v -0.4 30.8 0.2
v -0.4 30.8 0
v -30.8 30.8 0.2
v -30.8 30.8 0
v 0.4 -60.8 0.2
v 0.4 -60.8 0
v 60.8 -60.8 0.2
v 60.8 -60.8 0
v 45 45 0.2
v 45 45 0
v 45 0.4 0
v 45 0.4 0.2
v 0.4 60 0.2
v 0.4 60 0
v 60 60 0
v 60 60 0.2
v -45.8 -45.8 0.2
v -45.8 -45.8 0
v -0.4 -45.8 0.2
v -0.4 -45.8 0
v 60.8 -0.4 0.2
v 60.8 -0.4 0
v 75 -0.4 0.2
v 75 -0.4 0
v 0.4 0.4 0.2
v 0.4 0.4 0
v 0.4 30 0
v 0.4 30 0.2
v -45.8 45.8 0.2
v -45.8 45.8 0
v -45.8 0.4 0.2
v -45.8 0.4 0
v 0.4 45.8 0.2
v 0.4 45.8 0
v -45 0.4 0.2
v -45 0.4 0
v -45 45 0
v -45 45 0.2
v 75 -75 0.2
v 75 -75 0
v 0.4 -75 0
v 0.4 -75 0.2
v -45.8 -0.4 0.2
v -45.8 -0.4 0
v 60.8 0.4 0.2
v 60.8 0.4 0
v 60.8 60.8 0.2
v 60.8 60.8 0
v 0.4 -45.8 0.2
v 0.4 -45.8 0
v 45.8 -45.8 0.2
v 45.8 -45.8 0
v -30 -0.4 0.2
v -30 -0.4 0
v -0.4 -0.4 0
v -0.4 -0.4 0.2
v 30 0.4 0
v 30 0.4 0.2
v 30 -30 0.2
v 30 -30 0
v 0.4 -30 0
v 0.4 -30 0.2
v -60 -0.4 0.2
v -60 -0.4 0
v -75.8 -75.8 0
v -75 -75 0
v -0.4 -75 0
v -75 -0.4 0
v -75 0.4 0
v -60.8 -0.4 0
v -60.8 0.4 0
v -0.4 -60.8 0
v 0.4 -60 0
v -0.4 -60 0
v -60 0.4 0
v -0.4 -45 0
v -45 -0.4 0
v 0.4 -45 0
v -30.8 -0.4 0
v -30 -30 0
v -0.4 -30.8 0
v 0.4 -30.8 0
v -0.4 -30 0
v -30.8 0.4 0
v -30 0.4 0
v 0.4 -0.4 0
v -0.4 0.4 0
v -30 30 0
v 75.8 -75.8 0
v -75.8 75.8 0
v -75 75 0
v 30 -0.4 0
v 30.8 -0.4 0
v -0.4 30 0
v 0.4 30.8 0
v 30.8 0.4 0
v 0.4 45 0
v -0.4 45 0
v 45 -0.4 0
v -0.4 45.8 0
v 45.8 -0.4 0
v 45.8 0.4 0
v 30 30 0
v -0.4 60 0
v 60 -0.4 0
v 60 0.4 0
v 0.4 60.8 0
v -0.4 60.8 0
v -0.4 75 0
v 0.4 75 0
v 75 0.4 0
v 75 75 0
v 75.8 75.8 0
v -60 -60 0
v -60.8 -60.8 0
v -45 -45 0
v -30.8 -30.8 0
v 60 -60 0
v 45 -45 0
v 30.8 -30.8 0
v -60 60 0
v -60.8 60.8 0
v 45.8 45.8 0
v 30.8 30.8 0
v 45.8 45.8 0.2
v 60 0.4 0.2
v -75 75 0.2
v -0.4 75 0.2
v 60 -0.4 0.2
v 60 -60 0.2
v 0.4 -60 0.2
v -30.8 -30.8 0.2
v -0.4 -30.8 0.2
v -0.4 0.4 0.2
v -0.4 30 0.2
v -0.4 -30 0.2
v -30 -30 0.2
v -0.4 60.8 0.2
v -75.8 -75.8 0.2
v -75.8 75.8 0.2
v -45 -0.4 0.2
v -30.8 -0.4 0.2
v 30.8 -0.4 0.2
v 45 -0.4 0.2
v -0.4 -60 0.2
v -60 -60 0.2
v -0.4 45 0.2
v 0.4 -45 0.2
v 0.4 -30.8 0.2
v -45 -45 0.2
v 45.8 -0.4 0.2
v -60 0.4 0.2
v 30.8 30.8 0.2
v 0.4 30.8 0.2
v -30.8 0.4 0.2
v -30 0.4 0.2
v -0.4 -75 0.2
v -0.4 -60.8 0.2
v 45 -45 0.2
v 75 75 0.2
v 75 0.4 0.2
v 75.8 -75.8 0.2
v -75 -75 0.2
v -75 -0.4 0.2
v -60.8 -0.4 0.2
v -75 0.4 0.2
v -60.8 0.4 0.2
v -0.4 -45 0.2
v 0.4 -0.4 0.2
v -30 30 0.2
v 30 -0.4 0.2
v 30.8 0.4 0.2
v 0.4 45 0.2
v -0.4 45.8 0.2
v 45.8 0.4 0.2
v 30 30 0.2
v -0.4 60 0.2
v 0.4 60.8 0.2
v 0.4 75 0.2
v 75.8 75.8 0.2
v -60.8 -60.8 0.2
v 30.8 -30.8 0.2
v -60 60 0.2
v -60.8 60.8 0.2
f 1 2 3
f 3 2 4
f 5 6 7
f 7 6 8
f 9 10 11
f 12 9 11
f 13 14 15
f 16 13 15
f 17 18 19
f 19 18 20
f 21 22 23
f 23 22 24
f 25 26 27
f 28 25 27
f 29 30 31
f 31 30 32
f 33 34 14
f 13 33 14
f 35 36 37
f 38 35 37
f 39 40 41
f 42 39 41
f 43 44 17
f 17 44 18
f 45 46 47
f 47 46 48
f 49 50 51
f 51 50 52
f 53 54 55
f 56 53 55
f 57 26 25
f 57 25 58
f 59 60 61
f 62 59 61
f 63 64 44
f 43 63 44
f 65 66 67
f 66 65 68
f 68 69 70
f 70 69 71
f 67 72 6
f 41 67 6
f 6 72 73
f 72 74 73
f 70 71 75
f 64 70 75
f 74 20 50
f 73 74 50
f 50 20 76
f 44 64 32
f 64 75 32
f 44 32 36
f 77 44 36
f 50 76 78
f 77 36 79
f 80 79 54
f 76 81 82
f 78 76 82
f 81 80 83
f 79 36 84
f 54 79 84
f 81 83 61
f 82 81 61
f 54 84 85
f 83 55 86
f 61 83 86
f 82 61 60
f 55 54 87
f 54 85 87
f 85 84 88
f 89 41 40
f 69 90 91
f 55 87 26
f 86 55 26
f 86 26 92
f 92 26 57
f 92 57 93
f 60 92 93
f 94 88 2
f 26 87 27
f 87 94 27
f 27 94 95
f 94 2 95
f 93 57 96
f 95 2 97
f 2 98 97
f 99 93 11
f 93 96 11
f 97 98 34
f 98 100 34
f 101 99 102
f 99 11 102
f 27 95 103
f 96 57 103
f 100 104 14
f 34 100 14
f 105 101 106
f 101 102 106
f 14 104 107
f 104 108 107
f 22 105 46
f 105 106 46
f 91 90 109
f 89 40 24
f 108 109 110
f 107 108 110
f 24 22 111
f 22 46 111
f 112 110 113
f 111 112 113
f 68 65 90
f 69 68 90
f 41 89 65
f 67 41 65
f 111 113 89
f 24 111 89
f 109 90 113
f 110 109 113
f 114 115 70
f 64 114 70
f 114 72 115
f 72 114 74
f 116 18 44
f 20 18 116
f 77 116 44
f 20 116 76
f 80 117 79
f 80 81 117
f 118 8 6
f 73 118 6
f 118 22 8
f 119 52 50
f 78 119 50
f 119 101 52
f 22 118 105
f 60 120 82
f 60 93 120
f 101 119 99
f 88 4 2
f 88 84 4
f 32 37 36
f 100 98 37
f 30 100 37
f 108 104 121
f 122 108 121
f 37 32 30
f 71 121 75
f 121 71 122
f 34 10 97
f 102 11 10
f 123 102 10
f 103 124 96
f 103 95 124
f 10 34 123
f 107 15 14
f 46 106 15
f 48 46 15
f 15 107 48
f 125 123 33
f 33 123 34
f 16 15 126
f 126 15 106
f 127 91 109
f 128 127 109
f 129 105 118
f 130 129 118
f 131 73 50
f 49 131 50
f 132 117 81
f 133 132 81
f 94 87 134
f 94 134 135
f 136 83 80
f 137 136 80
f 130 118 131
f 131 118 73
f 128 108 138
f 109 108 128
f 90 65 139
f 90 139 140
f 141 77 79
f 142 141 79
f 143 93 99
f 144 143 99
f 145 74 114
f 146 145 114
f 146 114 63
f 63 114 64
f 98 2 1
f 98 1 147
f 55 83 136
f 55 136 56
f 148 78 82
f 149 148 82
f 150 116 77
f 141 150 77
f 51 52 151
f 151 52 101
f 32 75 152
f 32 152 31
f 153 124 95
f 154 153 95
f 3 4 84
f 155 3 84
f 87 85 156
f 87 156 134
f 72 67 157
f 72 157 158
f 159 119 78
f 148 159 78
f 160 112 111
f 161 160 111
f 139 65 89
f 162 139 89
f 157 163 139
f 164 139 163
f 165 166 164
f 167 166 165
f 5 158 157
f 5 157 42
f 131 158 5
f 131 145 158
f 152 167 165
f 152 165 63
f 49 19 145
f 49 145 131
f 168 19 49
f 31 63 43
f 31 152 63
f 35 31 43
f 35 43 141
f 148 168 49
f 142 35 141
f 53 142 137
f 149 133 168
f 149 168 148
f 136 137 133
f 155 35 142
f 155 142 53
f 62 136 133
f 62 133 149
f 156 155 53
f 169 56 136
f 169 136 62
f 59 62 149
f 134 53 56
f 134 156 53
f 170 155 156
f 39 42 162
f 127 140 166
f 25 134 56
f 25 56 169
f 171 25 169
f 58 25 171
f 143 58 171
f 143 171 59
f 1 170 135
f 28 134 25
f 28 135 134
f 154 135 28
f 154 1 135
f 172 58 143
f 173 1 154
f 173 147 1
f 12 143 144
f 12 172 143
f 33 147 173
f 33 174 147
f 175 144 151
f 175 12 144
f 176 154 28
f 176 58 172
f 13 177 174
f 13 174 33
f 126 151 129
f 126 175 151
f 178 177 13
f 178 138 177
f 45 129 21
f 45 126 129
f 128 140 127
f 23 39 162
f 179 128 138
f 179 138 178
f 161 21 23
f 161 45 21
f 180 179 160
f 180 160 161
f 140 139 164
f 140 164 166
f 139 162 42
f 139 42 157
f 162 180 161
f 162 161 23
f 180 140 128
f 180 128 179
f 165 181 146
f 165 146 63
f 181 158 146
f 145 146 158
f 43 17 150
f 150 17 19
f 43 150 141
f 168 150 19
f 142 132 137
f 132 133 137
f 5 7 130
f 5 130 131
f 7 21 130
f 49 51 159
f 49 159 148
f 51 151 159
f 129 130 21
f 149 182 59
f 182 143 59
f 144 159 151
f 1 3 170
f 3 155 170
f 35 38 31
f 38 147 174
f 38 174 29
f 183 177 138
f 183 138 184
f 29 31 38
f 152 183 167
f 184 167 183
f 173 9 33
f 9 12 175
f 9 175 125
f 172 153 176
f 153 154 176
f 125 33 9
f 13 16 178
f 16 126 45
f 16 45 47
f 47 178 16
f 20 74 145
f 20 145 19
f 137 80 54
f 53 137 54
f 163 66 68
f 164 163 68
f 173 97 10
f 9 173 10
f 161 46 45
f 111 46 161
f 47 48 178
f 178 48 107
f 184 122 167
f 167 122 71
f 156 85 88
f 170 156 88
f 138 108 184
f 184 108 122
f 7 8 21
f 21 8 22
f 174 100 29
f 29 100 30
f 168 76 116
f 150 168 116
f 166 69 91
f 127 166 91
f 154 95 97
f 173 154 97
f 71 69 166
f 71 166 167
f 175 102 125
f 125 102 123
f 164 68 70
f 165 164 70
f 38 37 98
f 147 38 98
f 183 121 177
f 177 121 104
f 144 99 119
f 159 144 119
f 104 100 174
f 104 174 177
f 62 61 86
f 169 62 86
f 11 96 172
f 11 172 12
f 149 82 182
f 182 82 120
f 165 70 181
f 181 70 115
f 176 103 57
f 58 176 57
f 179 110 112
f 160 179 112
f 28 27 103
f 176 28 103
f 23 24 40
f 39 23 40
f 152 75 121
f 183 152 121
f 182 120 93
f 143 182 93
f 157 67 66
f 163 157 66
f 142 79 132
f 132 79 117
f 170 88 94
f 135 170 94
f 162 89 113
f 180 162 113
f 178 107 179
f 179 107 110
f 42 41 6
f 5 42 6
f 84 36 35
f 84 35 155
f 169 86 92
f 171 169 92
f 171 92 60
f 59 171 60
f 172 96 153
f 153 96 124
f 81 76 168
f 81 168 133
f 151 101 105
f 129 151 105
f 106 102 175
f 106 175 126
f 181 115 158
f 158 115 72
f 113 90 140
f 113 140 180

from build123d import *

# Parameters (mm, degrees)
F0_W     = 151.6
F0_H     = 151.6
F0_W_2   = 29.6
F0_H_2   = 0.4
F0_W_3   = 0.4
F0_H_3   = 29.6
F0_W_4   = 14.2
F0_H_4   = 14.2
F0_W_5   = 0.8
F0_H_5   = 0.8
F1_DEPTH = 0.2


with BuildPart() as f1:
    # F0 (on Top) → F1 (new body)
    with BuildSketch(Plane.XY):
        Rectangle(F0_W, F0_H)
        Polygon((75, -0.4), (75, -75), (0.4, -75), (0, -75), (-0.4, -75), (-75, -75), (-75, -0.4), (-75, 0), (-75, 0.4), (-75, 75), (-0.4, 75), (0, 75), (0.4, 75), (75, 75), (75, 0.4), (75, 0), align=None, mode=Mode.SUBTRACT)
        Polygon((-60.8, 60.8), (-60.8, 0.4), (-60, 0.4), (-60, 60), (-0.4, 60), (-0.4, 60.8), align=None)
        Polygon((0.4, -60), (0.4, -60.8), (60.8, -60.8), (60.8, -0.4), (60, -0.4), (60, -60), align=None)
        Polygon((-60.8, -60.8), (-0.4, -60.8), (-0.4, -60), (-60, -60), (-60, -0.4), (-60.8, -0.4), align=None)
        Polygon((60, 0.4), (60.8, 0.4), (60.8, 60.8), (0.4, 60.8), (0.4, 60), (60, 60), align=None)
        Polygon((-45.8, 45.8), (-45.8, 0.4), (-45, 0.4), (-45, 45), (-0.4, 45), (-0.4, 45.8), align=None)
        Polygon((45, 0.4), (45.8, 0.4), (45.8, 45.8), (0.4, 45.8), (0.4, 45), (45, 45), align=None)
        Polygon((-45.8, -45.8), (-0.4, -45.8), (-0.4, -45), (-45, -45), (-45, -0.4), (-45.8, -0.4), align=None)
        Polygon((0.4, -45), (0.4, -45.8), (45.8, -45.8), (45.8, -0.4), (45, -0.4), (45, -45), align=None)
        Polygon((-30.8, 30.8), (-30.8, 0.4), (-30, 0.4), (-30, 30), (-0.4, 30), (-0.4, 30.8), align=None)
        Polygon((-30.8, -30.8), (-0.4, -30.8), (-0.4, -30), (-30, -30), (-30, -0.4), (-30.8, -0.4), align=None)
        Polygon((30, 0.4), (30.8, 0.4), (30.8, 30.8), (0.4, 30.8), (0.4, 30), (30, 30), align=None)
        Polygon((0.4, -30), (0.4, -30.8), (30.8, -30.8), (30.8, -0.4), (30, -0.4), (30, -30), align=None)
        with Locations((15.2, 0.2)):
            Rectangle(F0_W_2, F0_H_2)
        with Locations((-15.2, 0.2)):
            Rectangle(F0_W_2, F0_H_2)
        with Locations((15.2, -0.2)):
            Rectangle(F0_W_2, F0_H_2)
        with Locations((-0.2, 15.2)):
            Rectangle(F0_W_3, F0_H_3)
        with Locations((-15.2, -0.2)):
            Rectangle(F0_W_2, F0_H_2)
        with Locations((-0.2, -15.2)):
            Rectangle(F0_W_3, F0_H_3)
        with Locations((0.2, -15.2)):
            Rectangle(F0_W_3, F0_H_3)
        with Locations((0.2, 15.2)):
            Rectangle(F0_W_3, F0_H_3)
        with Locations((-52.9, -0.2)):
            Rectangle(F0_W_4, F0_H_2)
        with Locations((52.9, -0.2)):
            Rectangle(F0_W_4, F0_H_2)
        with Locations((-37.9, -0.2)):
            Rectangle(F0_W_4, F0_H_2)
        with Locations((67.9, 0.2)):
            Rectangle(F0_W_4, F0_H_2)
        with Locations((-67.9, 0.2)):
            Rectangle(F0_W_4, F0_H_2)
        with Locations((-52.9, 0.2)):
            Rectangle(F0_W_4, F0_H_2)
        with Locations((37.9, 0.2)):
            Rectangle(F0_W_4, F0_H_2)
        with Locations((52.9, 0.2)):
            Rectangle(F0_W_4, F0_H_2)
        with Locations((-37.9, 0.2)):
            Rectangle(F0_W_4, F0_H_2)
        with Locations((0.2, -67.9)):
            Rectangle(F0_W_3, F0_H_4)
        with Locations((-67.9, -0.2)):
            Rectangle(F0_W_4, F0_H_2)
        with Locations((-0.2, 52.9)):
            Rectangle(F0_W_3, F0_H_4)
        with Locations((-0.2, -52.9)):
            Rectangle(F0_W_3, F0_H_4)
        with Locations((0.2, 67.9)):
            Rectangle(F0_W_3, F0_H_4)
        with Locations((67.9, -0.2)):
            Rectangle(F0_W_4, F0_H_2)
        with Locations((0.2, -37.9)):
            Rectangle(F0_W_3, F0_H_4)
        with Locations((0.2, 37.9)):
            Rectangle(F0_W_3, F0_H_4)
        with Locations((37.9, -0.2)):
            Rectangle(F0_W_4, F0_H_2)
        with Locations((0.2, 52.9)):
            Rectangle(F0_W_3, F0_H_4)
        with Locations((-0.2, 37.9)):
            Rectangle(F0_W_3, F0_H_4)
        with Locations((-0.2, -37.9)):
            Rectangle(F0_W_3, F0_H_4)
        with Locations((-0.2, -67.9)):
            Rectangle(F0_W_3, F0_H_4)
        with Locations((-0.2, 67.9)):
            Rectangle(F0_W_3, F0_H_4)
        with Locations((0.2, -52.9)):
            Rectangle(F0_W_3, F0_H_4)
        with Locations((-45.4, 0.2)):
            Rectangle(F0_W_5, F0_H_2)
        with Locations((-60.4, -0.2)):
            Rectangle(F0_W_5, F0_H_2)
        with Locations((30.4, -0.2)):
            Rectangle(F0_W_5, F0_H_2)
        with Locations((-60.4, 0.2)):
            Rectangle(F0_W_5, F0_H_2)
        with Locations((60.4, 0.2)):
            Rectangle(F0_W_5, F0_H_2)
        with Locations((45.4, 0.2)):
            Rectangle(F0_W_5, F0_H_2)
        with Locations((-45.4, -0.2)):
            Rectangle(F0_W_5, F0_H_2)
        with Locations((-30.4, -0.2)):
            Rectangle(F0_W_5, F0_H_2)
        with Locations((-0.2, 45.4)):
            Rectangle(F0_W_3, F0_H_5)
        with Locations((-0.2, -30.4)):
            Rectangle(F0_W_3, F0_H_5)
        with Locations((60.4, -0.2)):
            Rectangle(F0_W_5, F0_H_2)
        with Locations((0.2, 60.4)):
            Rectangle(F0_W_3, F0_H_5)
        with Locations((0.2, -60.4)):
            Rectangle(F0_W_3, F0_H_5)
        with Locations((-30.4, 0.2)):
            Rectangle(F0_W_5, F0_H_2)
        with Locations((30.4, 0.2)):
            Rectangle(F0_W_5, F0_H_2)
        with Locations((-0.2, -60.4)):
            Rectangle(F0_W_3, F0_H_5)
        with Locations((-0.2, 60.4)):
            Rectangle(F0_W_3, F0_H_5)
        with Locations((-0.2, -45.4)):
            Rectangle(F0_W_3, F0_H_5)
        with Locations((0.2, 30.4)):
            Rectangle(F0_W_3, F0_H_5)
        with Locations((0.2, -30.4)):
            Rectangle(F0_W_3, F0_H_5)
        with Locations((45.4, -0.2)):
            Rectangle(F0_W_5, F0_H_2)
        with Locations((0.2, -45.4)):
            Rectangle(F0_W_3, F0_H_5)
        with Locations((0.2, 45.4)):
            Rectangle(F0_W_3, F0_H_5)
        with Locations((-0.2, 30.4)):
            Rectangle(F0_W_3, F0_H_5)
        with Locations((-0.2, 0.2)):
            Rectangle(F0_W_3, F0_H_2)
        with Locations((-0.2, -0.2)):
            Rectangle(F0_W_3, F0_H_2)
        with Locations((0.2, 0.2)):
            Rectangle(F0_W_3, F0_H_2)
        with Locations((0.2, -0.2)):
            Rectangle(F0_W_3, F0_H_2)
    extrude(amount=F1_DEPTH)


solid = f1.part
